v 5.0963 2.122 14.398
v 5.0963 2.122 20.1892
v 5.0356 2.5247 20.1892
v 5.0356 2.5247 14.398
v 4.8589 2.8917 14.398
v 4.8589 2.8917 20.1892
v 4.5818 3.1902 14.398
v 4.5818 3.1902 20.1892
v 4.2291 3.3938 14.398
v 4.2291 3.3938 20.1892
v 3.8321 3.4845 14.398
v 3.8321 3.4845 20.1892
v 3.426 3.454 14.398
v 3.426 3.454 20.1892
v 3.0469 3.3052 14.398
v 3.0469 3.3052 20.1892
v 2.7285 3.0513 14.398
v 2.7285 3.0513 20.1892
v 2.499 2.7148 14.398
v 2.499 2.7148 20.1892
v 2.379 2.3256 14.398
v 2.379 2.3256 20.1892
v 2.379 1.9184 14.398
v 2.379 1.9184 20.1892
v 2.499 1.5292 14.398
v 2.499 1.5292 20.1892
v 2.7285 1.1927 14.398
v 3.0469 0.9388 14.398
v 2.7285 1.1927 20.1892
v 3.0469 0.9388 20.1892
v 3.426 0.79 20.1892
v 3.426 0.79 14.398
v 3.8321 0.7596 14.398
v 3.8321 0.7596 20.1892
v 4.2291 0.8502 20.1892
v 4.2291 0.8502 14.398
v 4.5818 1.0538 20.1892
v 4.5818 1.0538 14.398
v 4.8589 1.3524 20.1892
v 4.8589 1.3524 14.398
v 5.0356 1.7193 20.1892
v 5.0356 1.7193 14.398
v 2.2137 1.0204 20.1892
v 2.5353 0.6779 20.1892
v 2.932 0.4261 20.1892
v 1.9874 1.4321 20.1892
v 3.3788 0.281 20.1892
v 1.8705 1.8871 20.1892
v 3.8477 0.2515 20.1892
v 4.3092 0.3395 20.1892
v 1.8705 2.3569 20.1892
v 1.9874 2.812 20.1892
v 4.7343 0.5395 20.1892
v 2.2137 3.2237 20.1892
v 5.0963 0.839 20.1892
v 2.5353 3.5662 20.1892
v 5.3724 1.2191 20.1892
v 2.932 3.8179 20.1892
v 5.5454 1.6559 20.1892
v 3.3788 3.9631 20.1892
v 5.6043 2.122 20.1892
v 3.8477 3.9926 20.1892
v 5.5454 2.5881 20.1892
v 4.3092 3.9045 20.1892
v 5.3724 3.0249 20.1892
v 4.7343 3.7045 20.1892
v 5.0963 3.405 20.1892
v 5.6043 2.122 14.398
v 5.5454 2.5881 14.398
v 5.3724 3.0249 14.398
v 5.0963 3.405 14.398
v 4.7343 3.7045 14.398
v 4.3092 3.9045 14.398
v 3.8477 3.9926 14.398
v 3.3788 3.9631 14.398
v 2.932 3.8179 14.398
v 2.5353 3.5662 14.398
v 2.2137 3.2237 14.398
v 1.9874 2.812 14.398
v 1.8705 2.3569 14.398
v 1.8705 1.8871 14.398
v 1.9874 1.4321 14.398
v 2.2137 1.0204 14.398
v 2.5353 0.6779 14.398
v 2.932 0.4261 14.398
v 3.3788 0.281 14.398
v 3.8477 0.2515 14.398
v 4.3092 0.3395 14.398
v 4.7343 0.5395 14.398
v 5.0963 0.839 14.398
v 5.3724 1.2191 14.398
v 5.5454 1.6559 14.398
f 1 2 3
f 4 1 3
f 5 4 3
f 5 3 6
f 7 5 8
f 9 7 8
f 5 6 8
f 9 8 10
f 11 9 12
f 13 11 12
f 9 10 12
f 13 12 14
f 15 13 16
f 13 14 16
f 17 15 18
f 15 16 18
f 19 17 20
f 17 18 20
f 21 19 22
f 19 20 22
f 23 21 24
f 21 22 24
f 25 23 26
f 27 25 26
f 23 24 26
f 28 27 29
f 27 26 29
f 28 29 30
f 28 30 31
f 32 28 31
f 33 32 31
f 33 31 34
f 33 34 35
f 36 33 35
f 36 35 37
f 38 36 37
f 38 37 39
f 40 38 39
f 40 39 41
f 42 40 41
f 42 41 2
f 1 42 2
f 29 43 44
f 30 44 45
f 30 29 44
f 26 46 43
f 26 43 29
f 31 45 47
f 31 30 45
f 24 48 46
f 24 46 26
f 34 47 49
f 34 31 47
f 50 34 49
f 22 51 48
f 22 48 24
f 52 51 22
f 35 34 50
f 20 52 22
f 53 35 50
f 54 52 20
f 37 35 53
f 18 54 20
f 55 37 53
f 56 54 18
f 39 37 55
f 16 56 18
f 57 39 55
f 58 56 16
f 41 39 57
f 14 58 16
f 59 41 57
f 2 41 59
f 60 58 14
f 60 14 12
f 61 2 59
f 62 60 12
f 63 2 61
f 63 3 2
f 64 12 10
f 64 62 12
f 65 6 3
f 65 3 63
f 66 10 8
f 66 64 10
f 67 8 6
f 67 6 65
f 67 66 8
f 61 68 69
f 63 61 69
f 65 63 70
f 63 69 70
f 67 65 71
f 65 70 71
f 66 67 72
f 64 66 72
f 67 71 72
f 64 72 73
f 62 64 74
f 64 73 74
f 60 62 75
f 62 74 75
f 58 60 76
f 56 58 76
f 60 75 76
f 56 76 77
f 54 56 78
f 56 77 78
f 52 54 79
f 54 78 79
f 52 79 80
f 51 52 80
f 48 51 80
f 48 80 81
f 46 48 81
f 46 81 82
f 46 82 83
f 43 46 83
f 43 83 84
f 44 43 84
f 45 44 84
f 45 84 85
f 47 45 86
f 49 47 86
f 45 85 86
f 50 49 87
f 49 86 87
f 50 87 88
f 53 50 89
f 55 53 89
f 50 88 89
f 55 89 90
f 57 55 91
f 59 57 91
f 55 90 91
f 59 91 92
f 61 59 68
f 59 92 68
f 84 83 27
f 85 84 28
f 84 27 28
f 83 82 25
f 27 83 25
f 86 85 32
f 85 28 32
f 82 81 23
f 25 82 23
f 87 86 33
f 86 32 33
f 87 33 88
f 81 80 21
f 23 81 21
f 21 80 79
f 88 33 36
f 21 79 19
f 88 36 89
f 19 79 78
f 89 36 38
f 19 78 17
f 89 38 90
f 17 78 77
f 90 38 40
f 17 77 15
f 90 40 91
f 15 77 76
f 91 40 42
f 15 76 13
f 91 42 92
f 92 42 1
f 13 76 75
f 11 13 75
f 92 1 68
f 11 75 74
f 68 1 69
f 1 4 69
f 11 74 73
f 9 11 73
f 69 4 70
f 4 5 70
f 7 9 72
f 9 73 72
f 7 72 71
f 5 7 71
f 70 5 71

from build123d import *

# Parameters (mm, degrees)
F0_W      = 10
F0_H      = 6.7840377057
F1_DEPTH  = 5
F2_W      = 3.0169537012
F2_H      = 6.7840377057
F2_H_2    = 2.6365290302
F3_DEPTH  = 5
F5_DEPTH  = 5
F6_DEPTH  = 3.302
F8_R      = 1.8742550682
F9_DEPTH  = 5.7912
F11_R     = 1.3662550682
F12_DEPTH = 25.4


with BuildPart() as f1:
    # F0 (on Top) → F1 (new body)
    with BuildSketch(Plane.XY):
        Rectangle(F0_W, F0_H)
    extrude(amount=F1_DEPTH)

    # F2 (on face) → F3 (join, through all)
    with BuildSketch(Plane.XY.offset(5)):
        with Locations((-3.4915231494, 0)):
            Rectangle(F2_W, F2_H)
        with Locations((-3.4915231494, 4.7102833679)):
            Rectangle(F2_W, F2_H_2)
    extrude(amount=-F3_DEPTH)

    # F4 (on face) → F5 (join, through all)
    with BuildSketch(Plane.XY.offset(5)):
        with BuildLine():
            ThreePointArc((5, -0.0776856728), (5.9297045256, 0.8520188529), (6.27, 2.1220188529))
            ThreePointArc((6.27, 2.1220188529), (4.3874003746, 4.5754704516), (1.5302954744, 3.3920188529))
            Line((1.5302954744, 3.3920188529), (5, 3.3920188529))
            Line((5, 3.3920188529), (5, -0.0776856728))
        make_face()
    extrude(amount=-F5_DEPTH)

    # F6 (cut): a face of the model
    f6_faces = [f1.faces().sort_by_distance(p)[0] for p in [
        (0.07415591, 0.7148582384, 5),
    ]]
    extrude(f6_faces, amount=-F6_DEPTH, mode=Mode.SUBTRACT)


with BuildPart() as f9:
    # F8 (on offset) → F9 (new body)
    with BuildSketch(Plane.XY.offset(14.398)):
        with Locations((3.73, 2.1220188529)):
            Circle(F8_R)
    extrude(amount=F9_DEPTH)

    # F11 (on face) → F12 (cut)
    with BuildSketch(Plane.XY.offset(20.1892)):
        with Locations((3.73, 2.1220188529)):
            Circle(F11_R)
    extrude(amount=-F12_DEPTH, mode=Mode.SUBTRACT)


solid = f9.part
